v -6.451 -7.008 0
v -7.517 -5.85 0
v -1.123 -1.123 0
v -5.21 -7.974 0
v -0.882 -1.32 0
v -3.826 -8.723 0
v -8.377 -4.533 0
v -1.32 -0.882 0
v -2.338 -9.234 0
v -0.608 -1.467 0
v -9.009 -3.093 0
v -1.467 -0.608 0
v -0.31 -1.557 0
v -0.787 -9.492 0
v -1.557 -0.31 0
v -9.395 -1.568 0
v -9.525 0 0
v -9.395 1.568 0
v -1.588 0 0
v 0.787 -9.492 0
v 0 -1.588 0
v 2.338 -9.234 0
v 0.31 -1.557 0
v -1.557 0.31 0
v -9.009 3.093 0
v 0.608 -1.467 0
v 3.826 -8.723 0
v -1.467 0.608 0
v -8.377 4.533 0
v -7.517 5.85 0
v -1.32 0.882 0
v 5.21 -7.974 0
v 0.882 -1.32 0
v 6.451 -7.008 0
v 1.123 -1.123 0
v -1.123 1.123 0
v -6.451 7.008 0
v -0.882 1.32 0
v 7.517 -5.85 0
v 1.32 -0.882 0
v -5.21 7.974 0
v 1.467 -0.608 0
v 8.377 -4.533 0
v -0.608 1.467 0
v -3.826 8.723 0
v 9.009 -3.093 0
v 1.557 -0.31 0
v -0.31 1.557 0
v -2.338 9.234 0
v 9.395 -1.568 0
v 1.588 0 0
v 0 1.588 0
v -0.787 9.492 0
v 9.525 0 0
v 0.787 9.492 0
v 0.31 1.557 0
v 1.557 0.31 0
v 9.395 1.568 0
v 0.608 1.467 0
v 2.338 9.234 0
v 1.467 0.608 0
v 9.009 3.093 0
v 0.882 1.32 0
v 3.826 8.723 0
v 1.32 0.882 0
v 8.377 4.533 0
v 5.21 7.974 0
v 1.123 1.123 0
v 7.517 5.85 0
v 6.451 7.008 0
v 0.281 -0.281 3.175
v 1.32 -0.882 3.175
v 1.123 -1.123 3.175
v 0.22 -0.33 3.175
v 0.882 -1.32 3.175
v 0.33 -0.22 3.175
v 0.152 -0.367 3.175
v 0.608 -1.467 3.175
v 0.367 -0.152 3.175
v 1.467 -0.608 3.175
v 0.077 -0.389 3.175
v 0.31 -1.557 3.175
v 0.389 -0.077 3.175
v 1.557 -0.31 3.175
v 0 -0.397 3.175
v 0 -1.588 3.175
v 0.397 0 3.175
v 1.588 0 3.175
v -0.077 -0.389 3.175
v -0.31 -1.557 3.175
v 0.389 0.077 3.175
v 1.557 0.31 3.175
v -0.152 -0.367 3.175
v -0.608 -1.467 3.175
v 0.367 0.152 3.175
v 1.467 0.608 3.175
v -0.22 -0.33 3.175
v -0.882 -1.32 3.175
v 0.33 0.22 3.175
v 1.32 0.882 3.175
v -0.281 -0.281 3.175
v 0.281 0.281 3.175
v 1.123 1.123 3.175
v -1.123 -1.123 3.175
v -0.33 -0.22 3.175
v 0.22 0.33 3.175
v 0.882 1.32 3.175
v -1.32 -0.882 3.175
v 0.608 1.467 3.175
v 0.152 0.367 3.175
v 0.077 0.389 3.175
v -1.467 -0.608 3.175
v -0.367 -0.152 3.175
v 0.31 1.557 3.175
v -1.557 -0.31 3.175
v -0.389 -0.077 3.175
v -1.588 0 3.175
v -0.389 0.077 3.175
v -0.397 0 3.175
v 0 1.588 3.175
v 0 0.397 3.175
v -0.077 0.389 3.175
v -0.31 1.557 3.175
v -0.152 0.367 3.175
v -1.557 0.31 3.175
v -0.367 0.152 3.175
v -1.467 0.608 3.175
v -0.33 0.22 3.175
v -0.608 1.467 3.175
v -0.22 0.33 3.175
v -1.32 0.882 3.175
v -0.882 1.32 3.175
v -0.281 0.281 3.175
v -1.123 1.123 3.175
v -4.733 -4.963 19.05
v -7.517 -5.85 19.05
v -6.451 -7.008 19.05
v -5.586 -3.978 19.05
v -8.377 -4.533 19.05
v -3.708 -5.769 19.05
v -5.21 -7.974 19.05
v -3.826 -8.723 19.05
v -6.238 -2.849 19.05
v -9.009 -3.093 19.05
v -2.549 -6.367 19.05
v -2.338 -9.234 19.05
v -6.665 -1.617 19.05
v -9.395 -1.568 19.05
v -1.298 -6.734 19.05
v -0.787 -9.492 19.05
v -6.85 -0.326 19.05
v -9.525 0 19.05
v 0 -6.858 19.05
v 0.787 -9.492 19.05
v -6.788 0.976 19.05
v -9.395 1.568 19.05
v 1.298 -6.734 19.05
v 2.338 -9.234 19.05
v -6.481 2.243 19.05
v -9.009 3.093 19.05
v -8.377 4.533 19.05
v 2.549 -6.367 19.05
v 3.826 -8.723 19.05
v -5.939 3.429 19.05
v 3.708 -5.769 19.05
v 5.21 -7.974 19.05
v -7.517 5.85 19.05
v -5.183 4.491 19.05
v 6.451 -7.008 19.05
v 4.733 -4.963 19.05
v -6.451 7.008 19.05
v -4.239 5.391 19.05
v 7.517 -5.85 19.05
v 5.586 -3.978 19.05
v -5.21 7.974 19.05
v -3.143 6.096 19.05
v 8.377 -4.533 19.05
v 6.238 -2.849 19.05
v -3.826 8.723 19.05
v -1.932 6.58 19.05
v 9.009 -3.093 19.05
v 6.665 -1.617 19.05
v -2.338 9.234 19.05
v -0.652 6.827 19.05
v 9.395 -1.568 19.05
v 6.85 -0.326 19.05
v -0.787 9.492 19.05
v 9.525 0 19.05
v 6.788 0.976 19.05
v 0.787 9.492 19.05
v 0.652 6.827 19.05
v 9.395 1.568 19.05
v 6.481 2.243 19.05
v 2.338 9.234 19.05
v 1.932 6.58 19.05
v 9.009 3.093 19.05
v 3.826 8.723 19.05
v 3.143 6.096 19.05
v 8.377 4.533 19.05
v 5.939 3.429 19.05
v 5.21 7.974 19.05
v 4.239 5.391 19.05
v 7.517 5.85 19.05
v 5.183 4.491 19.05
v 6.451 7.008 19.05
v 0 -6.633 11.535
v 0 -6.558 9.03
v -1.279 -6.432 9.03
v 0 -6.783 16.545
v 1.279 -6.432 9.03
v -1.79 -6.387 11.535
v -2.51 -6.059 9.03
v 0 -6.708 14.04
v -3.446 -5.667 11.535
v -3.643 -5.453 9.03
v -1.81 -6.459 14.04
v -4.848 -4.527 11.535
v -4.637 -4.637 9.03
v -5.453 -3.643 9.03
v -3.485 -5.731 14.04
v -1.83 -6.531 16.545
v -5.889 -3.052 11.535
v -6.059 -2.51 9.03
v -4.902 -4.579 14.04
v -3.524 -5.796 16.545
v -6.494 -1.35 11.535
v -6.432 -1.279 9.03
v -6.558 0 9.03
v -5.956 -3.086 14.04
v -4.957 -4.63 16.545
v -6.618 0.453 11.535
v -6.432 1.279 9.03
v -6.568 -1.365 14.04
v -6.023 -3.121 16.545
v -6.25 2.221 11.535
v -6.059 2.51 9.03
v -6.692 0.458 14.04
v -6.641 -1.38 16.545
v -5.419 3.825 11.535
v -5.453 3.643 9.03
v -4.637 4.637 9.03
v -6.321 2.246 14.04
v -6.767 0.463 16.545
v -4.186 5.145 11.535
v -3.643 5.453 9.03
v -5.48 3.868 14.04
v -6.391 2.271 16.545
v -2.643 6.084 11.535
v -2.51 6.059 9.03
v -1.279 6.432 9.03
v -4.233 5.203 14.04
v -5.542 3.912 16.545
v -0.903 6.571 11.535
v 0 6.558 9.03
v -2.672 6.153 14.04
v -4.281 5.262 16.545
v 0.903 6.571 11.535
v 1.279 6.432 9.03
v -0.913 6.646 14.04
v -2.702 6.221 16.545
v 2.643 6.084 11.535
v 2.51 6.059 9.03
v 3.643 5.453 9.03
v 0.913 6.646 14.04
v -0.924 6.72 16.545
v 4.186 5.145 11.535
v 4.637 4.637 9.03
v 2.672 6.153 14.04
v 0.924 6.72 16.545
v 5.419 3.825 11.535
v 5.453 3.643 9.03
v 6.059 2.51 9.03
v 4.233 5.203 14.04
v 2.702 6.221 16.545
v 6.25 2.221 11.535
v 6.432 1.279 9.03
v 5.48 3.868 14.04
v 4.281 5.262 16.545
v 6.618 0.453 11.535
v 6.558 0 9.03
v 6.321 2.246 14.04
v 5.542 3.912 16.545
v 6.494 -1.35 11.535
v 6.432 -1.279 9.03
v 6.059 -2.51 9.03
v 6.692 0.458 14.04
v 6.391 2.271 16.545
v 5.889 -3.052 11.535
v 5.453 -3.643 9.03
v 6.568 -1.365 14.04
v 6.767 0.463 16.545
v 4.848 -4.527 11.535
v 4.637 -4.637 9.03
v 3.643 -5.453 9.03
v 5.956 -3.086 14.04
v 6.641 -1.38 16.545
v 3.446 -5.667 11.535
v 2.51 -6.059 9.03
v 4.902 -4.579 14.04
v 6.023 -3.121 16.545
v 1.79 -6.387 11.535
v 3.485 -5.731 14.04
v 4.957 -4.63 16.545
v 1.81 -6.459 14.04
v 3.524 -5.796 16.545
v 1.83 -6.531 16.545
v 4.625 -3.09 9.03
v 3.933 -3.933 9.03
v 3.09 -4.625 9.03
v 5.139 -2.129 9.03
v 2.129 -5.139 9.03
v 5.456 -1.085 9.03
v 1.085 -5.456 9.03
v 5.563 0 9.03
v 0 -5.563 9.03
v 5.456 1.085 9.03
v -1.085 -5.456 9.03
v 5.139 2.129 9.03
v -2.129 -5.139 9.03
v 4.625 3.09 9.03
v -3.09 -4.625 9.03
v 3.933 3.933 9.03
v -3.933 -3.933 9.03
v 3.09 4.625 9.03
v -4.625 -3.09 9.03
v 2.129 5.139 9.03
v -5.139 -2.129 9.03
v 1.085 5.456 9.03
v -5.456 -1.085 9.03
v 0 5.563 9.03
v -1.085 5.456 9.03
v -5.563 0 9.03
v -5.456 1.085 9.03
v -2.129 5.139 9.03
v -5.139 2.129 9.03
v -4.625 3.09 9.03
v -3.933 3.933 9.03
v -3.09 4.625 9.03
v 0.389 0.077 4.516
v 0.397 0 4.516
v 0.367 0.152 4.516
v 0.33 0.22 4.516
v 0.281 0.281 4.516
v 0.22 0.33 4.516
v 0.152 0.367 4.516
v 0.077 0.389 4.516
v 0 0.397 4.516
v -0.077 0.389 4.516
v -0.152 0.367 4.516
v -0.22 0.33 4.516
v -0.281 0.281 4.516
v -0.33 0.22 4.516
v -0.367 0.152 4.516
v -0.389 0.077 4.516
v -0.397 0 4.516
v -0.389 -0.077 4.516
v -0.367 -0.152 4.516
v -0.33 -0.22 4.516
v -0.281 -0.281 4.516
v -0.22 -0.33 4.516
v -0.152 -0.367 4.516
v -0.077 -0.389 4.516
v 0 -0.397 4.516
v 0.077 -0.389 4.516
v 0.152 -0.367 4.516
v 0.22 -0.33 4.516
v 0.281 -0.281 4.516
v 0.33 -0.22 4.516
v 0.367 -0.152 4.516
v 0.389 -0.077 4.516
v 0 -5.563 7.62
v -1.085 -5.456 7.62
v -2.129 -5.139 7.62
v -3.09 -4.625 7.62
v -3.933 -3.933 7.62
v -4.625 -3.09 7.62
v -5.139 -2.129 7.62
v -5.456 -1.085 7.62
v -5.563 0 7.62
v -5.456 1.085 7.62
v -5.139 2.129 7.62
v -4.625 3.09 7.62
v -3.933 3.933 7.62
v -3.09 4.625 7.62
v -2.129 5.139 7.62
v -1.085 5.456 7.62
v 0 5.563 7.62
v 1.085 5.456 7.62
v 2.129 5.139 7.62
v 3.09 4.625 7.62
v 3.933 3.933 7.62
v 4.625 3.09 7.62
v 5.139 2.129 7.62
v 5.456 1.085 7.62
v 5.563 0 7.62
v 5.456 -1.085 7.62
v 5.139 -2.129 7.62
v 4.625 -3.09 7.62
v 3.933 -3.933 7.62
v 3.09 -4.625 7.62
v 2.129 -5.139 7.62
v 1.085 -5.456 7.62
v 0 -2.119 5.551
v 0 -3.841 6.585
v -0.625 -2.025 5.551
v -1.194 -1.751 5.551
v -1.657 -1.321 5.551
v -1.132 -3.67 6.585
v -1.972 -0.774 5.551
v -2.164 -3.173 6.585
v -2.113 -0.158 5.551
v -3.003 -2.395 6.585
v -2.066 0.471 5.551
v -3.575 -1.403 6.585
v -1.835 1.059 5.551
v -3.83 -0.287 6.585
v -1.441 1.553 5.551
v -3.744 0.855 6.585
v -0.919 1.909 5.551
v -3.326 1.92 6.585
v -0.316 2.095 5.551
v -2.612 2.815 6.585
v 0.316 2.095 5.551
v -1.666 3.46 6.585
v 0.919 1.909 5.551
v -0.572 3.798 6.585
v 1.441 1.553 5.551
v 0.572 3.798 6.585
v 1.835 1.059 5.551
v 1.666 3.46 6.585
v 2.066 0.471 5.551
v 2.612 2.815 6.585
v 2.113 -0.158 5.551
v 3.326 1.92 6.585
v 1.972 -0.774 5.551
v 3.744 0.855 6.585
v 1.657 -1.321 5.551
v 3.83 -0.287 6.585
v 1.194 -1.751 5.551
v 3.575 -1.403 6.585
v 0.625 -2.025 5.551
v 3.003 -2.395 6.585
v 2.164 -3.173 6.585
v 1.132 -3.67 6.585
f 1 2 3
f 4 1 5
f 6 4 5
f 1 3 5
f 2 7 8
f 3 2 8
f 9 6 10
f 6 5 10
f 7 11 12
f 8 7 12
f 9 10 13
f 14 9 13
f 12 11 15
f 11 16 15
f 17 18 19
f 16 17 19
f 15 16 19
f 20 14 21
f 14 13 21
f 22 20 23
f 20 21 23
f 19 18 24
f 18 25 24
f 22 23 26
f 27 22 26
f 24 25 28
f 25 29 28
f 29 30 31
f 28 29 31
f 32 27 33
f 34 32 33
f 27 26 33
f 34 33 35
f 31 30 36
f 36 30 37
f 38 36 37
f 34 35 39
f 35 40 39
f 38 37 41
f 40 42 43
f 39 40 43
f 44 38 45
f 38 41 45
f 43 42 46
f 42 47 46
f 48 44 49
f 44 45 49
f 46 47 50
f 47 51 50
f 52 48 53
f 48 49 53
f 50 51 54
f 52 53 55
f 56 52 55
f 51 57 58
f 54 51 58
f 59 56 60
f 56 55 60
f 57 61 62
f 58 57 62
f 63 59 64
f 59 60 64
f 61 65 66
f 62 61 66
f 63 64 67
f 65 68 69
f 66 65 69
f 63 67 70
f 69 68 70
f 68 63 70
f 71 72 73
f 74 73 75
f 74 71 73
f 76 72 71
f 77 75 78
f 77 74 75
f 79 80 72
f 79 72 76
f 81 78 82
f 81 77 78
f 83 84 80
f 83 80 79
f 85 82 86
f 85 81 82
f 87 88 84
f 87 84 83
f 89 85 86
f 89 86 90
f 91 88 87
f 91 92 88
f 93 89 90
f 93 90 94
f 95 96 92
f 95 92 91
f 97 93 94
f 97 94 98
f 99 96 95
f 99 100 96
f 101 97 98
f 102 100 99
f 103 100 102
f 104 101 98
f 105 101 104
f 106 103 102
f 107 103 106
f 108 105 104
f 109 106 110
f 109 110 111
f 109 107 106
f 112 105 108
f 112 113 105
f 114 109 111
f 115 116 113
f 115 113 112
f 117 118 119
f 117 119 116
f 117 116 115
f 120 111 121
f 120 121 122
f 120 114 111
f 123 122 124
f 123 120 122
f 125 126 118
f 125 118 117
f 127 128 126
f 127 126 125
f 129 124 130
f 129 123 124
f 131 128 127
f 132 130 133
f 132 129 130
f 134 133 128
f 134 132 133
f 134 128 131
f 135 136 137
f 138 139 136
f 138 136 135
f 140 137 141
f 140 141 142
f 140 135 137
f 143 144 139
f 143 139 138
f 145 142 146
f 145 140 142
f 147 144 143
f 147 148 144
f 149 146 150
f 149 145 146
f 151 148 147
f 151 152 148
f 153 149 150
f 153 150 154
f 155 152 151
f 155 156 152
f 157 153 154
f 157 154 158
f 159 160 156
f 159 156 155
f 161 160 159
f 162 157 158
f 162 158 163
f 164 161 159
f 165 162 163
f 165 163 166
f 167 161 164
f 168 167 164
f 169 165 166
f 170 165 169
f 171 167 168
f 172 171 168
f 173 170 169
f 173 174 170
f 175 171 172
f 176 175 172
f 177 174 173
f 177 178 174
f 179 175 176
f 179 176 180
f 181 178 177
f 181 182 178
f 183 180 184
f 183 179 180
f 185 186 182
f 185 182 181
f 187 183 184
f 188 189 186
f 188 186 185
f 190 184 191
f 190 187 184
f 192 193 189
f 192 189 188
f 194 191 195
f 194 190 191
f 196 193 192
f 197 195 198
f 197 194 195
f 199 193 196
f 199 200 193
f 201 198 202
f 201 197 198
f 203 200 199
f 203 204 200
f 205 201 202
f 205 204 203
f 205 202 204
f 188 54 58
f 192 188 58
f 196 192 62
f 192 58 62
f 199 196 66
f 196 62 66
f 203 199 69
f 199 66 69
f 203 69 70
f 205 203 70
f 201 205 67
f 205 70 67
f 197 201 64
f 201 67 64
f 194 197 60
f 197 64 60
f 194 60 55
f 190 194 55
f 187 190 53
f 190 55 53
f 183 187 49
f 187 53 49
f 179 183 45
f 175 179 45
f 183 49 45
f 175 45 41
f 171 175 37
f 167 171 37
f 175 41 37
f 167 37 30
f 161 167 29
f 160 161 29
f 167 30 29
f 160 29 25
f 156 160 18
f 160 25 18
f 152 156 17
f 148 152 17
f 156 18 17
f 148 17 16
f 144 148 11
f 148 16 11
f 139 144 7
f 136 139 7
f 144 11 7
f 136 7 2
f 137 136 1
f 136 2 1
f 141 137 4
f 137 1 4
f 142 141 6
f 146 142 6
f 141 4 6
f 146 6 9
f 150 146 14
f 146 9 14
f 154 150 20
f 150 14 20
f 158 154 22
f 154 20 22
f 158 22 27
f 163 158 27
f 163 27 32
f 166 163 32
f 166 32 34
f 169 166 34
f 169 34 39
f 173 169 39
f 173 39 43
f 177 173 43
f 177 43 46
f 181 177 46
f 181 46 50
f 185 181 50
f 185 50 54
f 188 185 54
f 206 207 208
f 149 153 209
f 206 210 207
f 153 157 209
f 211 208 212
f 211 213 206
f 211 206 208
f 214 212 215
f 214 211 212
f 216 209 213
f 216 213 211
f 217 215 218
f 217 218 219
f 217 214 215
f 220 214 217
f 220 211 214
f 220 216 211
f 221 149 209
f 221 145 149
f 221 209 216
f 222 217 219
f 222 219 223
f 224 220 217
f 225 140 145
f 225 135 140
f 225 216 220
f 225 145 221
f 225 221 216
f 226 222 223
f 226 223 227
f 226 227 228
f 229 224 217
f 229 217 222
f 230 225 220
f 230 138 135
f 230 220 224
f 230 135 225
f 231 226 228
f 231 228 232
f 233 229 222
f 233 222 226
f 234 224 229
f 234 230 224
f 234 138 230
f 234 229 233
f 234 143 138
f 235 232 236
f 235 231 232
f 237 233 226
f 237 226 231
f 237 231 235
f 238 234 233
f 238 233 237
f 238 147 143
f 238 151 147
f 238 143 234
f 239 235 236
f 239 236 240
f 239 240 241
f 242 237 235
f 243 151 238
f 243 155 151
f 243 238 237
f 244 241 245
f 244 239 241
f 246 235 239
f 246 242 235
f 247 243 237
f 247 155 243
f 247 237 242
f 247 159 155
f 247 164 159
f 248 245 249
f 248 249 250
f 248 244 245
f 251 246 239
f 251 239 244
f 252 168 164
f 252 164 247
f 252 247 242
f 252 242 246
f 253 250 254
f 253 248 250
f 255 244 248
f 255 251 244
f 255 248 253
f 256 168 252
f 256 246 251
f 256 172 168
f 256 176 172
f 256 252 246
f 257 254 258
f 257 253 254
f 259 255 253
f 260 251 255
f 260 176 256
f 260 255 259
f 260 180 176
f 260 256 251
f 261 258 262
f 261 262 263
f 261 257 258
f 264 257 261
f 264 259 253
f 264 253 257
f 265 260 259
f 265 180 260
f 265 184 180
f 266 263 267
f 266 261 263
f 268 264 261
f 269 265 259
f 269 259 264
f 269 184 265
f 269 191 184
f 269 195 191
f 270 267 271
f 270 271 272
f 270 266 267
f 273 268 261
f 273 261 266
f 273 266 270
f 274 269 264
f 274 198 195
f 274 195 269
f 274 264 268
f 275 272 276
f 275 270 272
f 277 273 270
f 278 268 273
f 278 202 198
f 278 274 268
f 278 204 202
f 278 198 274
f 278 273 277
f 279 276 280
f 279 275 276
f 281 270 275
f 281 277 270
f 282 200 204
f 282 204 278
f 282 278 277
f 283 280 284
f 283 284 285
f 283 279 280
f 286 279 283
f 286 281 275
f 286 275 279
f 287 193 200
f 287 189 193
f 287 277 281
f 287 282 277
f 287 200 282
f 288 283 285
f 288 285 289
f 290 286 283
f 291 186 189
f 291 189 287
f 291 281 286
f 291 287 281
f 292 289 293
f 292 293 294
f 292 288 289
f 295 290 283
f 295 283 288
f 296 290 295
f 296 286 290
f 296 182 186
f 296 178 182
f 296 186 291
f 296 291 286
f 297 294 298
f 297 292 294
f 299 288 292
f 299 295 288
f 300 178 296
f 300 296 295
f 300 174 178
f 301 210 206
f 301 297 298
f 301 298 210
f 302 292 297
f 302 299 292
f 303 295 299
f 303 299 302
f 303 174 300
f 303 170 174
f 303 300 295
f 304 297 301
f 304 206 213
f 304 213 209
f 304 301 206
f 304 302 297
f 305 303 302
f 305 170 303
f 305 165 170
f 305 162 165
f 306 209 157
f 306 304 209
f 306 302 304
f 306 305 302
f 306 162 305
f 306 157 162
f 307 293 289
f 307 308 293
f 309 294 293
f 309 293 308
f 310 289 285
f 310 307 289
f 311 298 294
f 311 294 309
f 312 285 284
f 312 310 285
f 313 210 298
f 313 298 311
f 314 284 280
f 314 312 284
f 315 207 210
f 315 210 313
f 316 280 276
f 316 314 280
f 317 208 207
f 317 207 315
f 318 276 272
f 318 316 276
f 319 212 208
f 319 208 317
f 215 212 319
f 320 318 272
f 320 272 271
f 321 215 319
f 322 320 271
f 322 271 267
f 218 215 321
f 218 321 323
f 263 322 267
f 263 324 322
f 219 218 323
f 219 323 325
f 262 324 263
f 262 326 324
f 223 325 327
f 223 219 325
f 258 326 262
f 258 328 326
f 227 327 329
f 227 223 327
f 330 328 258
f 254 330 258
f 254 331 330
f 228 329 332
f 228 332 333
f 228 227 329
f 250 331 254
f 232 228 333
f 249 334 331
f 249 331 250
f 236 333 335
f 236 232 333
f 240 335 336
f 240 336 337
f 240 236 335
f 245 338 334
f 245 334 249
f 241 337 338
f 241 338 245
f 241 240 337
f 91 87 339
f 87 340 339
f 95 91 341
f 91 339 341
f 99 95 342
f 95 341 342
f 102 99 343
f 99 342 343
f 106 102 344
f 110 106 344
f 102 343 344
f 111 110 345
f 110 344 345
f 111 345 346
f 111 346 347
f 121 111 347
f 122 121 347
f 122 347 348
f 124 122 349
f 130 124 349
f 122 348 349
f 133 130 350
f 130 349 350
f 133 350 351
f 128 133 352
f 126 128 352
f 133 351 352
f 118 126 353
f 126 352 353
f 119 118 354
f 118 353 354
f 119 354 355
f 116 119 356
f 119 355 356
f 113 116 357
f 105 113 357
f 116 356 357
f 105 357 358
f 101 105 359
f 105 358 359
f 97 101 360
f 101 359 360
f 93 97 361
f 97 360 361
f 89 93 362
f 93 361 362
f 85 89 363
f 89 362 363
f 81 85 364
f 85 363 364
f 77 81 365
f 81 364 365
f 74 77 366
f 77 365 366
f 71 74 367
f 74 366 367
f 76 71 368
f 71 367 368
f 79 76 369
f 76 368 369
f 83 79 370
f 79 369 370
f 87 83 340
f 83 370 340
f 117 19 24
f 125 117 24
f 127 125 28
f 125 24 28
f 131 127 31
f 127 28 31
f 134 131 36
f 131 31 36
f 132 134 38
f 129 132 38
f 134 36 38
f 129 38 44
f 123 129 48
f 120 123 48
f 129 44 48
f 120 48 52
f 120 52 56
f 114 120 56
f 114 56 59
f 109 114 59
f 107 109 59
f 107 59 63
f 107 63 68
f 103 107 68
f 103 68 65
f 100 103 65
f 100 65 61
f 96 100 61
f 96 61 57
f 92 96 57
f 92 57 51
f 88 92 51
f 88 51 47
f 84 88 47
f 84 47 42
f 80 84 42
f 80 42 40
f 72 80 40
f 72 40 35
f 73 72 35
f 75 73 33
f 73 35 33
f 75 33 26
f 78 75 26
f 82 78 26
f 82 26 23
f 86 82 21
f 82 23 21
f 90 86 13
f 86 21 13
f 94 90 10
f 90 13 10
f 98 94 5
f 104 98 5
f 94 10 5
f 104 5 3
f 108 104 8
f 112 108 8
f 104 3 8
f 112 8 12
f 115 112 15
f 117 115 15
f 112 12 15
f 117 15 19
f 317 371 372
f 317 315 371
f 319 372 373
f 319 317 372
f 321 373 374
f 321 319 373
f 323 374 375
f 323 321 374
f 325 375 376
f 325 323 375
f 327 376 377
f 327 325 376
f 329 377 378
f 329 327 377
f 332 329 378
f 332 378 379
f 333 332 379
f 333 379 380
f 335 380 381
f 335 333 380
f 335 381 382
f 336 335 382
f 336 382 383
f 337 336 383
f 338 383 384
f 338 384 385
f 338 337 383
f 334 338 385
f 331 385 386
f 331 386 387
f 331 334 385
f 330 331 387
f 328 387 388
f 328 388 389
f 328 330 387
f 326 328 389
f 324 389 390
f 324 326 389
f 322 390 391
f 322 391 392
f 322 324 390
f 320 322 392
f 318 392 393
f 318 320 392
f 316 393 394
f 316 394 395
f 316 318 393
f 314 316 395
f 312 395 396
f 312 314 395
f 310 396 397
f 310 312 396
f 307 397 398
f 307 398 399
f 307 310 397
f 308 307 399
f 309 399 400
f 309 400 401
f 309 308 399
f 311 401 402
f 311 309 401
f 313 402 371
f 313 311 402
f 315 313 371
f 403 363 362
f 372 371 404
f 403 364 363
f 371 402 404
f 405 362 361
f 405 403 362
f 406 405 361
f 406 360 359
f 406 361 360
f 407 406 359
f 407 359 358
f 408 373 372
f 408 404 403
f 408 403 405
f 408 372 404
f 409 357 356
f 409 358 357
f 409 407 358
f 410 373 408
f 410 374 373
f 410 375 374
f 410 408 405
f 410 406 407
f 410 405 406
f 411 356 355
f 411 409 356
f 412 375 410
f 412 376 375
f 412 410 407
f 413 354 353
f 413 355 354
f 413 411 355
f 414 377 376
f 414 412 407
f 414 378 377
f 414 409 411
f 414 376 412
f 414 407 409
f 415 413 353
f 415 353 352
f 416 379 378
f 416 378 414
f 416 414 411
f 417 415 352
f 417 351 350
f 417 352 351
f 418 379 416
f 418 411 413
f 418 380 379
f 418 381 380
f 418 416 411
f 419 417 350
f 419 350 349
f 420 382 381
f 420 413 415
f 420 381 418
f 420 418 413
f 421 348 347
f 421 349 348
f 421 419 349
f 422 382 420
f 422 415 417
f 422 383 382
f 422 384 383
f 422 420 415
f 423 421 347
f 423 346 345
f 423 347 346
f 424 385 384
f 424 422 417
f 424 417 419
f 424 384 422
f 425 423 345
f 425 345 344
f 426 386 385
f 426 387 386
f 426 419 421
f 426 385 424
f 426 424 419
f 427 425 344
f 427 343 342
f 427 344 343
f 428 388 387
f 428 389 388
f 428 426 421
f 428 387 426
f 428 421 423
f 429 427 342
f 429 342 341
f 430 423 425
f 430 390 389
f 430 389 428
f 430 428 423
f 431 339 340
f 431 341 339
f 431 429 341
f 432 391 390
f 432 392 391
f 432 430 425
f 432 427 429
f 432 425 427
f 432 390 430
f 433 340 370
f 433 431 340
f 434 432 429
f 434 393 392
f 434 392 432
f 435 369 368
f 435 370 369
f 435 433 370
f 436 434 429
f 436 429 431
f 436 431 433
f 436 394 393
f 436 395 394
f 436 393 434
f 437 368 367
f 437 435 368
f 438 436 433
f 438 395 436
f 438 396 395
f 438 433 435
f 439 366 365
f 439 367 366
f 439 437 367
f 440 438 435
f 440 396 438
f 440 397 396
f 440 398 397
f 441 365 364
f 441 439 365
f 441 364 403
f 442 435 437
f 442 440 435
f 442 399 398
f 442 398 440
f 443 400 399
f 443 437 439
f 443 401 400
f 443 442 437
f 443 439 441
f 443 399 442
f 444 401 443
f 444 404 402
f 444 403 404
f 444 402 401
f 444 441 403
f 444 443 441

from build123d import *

# Parameters (mm, degrees)
SKETCH1_R                                        = 9.525
BOSS_EXTRUDE1_DEPTH                              = 19.05
CBORE_FOR_1_4_SOCKET_HEAD_CAP_SCREW1_D           = 0.79375
CBORE_FOR_1_4_SOCKET_HEAD_CAP_SCREW1_DEPTH       = 12.7
CBORE_FOR_1_4_SOCKET_HEAD_CAP_SCREW1_CBORE_D     = 3.175
CBORE_FOR_1_4_SOCKET_HEAD_CAP_SCREW1_CBORE_DEPTH = 3.175
CBORE_FOR_1_4_SOCKET_HEAD_CAP_SCREW1_TIP         = 0.238466558


with BuildPart() as part:
    # Sketch1 → Boss-Extrude1 (new body)
    with BuildSketch(Plane.XY):
        Circle(SKETCH1_R)
    extrude(amount=BOSS_EXTRUDE1_DEPTH)

    # Sketch6 → 1/4 NPT Tapped Hole1 (revolve, cut)
    with BuildSketch(Plane(origin=(0, 0, 19.05), x_dir=(0, -1, 0), z_dir=(1, 0, 0))):
        Polygon((0, 0), (0, 14.772347279), (5.5626, 11.43), (5.5626, 10.0203), (6.557978799, 10.0203), (6.858, 0), align=None)
    revolve(axis=Axis((0, 0, 25.4), (0, 0, -1)), mode=Mode.SUBTRACT)

    # CBORE for 1/4 Socket Head Cap Screw1
    with Locations(Plane(origin=(0, 0, 0), x_dir=(-1, 0, 0), z_dir=(0, 0, -1))):
        with Locations((0, 0)):
            CounterBoreHole(CBORE_FOR_1_4_SOCKET_HEAD_CAP_SCREW1_D / 2, CBORE_FOR_1_4_SOCKET_HEAD_CAP_SCREW1_CBORE_D / 2, CBORE_FOR_1_4_SOCKET_HEAD_CAP_SCREW1_CBORE_DEPTH, depth=CBORE_FOR_1_4_SOCKET_HEAD_CAP_SCREW1_DEPTH)
            with Locations((0, 0, -(CBORE_FOR_1_4_SOCKET_HEAD_CAP_SCREW1_DEPTH + CBORE_FOR_1_4_SOCKET_HEAD_CAP_SCREW1_TIP / 2))):  # 118° drill point
                Cone(0, CBORE_FOR_1_4_SOCKET_HEAD_CAP_SCREW1_D / 2, CBORE_FOR_1_4_SOCKET_HEAD_CAP_SCREW1_TIP, mode=Mode.SUBTRACT)


solid = part.part
